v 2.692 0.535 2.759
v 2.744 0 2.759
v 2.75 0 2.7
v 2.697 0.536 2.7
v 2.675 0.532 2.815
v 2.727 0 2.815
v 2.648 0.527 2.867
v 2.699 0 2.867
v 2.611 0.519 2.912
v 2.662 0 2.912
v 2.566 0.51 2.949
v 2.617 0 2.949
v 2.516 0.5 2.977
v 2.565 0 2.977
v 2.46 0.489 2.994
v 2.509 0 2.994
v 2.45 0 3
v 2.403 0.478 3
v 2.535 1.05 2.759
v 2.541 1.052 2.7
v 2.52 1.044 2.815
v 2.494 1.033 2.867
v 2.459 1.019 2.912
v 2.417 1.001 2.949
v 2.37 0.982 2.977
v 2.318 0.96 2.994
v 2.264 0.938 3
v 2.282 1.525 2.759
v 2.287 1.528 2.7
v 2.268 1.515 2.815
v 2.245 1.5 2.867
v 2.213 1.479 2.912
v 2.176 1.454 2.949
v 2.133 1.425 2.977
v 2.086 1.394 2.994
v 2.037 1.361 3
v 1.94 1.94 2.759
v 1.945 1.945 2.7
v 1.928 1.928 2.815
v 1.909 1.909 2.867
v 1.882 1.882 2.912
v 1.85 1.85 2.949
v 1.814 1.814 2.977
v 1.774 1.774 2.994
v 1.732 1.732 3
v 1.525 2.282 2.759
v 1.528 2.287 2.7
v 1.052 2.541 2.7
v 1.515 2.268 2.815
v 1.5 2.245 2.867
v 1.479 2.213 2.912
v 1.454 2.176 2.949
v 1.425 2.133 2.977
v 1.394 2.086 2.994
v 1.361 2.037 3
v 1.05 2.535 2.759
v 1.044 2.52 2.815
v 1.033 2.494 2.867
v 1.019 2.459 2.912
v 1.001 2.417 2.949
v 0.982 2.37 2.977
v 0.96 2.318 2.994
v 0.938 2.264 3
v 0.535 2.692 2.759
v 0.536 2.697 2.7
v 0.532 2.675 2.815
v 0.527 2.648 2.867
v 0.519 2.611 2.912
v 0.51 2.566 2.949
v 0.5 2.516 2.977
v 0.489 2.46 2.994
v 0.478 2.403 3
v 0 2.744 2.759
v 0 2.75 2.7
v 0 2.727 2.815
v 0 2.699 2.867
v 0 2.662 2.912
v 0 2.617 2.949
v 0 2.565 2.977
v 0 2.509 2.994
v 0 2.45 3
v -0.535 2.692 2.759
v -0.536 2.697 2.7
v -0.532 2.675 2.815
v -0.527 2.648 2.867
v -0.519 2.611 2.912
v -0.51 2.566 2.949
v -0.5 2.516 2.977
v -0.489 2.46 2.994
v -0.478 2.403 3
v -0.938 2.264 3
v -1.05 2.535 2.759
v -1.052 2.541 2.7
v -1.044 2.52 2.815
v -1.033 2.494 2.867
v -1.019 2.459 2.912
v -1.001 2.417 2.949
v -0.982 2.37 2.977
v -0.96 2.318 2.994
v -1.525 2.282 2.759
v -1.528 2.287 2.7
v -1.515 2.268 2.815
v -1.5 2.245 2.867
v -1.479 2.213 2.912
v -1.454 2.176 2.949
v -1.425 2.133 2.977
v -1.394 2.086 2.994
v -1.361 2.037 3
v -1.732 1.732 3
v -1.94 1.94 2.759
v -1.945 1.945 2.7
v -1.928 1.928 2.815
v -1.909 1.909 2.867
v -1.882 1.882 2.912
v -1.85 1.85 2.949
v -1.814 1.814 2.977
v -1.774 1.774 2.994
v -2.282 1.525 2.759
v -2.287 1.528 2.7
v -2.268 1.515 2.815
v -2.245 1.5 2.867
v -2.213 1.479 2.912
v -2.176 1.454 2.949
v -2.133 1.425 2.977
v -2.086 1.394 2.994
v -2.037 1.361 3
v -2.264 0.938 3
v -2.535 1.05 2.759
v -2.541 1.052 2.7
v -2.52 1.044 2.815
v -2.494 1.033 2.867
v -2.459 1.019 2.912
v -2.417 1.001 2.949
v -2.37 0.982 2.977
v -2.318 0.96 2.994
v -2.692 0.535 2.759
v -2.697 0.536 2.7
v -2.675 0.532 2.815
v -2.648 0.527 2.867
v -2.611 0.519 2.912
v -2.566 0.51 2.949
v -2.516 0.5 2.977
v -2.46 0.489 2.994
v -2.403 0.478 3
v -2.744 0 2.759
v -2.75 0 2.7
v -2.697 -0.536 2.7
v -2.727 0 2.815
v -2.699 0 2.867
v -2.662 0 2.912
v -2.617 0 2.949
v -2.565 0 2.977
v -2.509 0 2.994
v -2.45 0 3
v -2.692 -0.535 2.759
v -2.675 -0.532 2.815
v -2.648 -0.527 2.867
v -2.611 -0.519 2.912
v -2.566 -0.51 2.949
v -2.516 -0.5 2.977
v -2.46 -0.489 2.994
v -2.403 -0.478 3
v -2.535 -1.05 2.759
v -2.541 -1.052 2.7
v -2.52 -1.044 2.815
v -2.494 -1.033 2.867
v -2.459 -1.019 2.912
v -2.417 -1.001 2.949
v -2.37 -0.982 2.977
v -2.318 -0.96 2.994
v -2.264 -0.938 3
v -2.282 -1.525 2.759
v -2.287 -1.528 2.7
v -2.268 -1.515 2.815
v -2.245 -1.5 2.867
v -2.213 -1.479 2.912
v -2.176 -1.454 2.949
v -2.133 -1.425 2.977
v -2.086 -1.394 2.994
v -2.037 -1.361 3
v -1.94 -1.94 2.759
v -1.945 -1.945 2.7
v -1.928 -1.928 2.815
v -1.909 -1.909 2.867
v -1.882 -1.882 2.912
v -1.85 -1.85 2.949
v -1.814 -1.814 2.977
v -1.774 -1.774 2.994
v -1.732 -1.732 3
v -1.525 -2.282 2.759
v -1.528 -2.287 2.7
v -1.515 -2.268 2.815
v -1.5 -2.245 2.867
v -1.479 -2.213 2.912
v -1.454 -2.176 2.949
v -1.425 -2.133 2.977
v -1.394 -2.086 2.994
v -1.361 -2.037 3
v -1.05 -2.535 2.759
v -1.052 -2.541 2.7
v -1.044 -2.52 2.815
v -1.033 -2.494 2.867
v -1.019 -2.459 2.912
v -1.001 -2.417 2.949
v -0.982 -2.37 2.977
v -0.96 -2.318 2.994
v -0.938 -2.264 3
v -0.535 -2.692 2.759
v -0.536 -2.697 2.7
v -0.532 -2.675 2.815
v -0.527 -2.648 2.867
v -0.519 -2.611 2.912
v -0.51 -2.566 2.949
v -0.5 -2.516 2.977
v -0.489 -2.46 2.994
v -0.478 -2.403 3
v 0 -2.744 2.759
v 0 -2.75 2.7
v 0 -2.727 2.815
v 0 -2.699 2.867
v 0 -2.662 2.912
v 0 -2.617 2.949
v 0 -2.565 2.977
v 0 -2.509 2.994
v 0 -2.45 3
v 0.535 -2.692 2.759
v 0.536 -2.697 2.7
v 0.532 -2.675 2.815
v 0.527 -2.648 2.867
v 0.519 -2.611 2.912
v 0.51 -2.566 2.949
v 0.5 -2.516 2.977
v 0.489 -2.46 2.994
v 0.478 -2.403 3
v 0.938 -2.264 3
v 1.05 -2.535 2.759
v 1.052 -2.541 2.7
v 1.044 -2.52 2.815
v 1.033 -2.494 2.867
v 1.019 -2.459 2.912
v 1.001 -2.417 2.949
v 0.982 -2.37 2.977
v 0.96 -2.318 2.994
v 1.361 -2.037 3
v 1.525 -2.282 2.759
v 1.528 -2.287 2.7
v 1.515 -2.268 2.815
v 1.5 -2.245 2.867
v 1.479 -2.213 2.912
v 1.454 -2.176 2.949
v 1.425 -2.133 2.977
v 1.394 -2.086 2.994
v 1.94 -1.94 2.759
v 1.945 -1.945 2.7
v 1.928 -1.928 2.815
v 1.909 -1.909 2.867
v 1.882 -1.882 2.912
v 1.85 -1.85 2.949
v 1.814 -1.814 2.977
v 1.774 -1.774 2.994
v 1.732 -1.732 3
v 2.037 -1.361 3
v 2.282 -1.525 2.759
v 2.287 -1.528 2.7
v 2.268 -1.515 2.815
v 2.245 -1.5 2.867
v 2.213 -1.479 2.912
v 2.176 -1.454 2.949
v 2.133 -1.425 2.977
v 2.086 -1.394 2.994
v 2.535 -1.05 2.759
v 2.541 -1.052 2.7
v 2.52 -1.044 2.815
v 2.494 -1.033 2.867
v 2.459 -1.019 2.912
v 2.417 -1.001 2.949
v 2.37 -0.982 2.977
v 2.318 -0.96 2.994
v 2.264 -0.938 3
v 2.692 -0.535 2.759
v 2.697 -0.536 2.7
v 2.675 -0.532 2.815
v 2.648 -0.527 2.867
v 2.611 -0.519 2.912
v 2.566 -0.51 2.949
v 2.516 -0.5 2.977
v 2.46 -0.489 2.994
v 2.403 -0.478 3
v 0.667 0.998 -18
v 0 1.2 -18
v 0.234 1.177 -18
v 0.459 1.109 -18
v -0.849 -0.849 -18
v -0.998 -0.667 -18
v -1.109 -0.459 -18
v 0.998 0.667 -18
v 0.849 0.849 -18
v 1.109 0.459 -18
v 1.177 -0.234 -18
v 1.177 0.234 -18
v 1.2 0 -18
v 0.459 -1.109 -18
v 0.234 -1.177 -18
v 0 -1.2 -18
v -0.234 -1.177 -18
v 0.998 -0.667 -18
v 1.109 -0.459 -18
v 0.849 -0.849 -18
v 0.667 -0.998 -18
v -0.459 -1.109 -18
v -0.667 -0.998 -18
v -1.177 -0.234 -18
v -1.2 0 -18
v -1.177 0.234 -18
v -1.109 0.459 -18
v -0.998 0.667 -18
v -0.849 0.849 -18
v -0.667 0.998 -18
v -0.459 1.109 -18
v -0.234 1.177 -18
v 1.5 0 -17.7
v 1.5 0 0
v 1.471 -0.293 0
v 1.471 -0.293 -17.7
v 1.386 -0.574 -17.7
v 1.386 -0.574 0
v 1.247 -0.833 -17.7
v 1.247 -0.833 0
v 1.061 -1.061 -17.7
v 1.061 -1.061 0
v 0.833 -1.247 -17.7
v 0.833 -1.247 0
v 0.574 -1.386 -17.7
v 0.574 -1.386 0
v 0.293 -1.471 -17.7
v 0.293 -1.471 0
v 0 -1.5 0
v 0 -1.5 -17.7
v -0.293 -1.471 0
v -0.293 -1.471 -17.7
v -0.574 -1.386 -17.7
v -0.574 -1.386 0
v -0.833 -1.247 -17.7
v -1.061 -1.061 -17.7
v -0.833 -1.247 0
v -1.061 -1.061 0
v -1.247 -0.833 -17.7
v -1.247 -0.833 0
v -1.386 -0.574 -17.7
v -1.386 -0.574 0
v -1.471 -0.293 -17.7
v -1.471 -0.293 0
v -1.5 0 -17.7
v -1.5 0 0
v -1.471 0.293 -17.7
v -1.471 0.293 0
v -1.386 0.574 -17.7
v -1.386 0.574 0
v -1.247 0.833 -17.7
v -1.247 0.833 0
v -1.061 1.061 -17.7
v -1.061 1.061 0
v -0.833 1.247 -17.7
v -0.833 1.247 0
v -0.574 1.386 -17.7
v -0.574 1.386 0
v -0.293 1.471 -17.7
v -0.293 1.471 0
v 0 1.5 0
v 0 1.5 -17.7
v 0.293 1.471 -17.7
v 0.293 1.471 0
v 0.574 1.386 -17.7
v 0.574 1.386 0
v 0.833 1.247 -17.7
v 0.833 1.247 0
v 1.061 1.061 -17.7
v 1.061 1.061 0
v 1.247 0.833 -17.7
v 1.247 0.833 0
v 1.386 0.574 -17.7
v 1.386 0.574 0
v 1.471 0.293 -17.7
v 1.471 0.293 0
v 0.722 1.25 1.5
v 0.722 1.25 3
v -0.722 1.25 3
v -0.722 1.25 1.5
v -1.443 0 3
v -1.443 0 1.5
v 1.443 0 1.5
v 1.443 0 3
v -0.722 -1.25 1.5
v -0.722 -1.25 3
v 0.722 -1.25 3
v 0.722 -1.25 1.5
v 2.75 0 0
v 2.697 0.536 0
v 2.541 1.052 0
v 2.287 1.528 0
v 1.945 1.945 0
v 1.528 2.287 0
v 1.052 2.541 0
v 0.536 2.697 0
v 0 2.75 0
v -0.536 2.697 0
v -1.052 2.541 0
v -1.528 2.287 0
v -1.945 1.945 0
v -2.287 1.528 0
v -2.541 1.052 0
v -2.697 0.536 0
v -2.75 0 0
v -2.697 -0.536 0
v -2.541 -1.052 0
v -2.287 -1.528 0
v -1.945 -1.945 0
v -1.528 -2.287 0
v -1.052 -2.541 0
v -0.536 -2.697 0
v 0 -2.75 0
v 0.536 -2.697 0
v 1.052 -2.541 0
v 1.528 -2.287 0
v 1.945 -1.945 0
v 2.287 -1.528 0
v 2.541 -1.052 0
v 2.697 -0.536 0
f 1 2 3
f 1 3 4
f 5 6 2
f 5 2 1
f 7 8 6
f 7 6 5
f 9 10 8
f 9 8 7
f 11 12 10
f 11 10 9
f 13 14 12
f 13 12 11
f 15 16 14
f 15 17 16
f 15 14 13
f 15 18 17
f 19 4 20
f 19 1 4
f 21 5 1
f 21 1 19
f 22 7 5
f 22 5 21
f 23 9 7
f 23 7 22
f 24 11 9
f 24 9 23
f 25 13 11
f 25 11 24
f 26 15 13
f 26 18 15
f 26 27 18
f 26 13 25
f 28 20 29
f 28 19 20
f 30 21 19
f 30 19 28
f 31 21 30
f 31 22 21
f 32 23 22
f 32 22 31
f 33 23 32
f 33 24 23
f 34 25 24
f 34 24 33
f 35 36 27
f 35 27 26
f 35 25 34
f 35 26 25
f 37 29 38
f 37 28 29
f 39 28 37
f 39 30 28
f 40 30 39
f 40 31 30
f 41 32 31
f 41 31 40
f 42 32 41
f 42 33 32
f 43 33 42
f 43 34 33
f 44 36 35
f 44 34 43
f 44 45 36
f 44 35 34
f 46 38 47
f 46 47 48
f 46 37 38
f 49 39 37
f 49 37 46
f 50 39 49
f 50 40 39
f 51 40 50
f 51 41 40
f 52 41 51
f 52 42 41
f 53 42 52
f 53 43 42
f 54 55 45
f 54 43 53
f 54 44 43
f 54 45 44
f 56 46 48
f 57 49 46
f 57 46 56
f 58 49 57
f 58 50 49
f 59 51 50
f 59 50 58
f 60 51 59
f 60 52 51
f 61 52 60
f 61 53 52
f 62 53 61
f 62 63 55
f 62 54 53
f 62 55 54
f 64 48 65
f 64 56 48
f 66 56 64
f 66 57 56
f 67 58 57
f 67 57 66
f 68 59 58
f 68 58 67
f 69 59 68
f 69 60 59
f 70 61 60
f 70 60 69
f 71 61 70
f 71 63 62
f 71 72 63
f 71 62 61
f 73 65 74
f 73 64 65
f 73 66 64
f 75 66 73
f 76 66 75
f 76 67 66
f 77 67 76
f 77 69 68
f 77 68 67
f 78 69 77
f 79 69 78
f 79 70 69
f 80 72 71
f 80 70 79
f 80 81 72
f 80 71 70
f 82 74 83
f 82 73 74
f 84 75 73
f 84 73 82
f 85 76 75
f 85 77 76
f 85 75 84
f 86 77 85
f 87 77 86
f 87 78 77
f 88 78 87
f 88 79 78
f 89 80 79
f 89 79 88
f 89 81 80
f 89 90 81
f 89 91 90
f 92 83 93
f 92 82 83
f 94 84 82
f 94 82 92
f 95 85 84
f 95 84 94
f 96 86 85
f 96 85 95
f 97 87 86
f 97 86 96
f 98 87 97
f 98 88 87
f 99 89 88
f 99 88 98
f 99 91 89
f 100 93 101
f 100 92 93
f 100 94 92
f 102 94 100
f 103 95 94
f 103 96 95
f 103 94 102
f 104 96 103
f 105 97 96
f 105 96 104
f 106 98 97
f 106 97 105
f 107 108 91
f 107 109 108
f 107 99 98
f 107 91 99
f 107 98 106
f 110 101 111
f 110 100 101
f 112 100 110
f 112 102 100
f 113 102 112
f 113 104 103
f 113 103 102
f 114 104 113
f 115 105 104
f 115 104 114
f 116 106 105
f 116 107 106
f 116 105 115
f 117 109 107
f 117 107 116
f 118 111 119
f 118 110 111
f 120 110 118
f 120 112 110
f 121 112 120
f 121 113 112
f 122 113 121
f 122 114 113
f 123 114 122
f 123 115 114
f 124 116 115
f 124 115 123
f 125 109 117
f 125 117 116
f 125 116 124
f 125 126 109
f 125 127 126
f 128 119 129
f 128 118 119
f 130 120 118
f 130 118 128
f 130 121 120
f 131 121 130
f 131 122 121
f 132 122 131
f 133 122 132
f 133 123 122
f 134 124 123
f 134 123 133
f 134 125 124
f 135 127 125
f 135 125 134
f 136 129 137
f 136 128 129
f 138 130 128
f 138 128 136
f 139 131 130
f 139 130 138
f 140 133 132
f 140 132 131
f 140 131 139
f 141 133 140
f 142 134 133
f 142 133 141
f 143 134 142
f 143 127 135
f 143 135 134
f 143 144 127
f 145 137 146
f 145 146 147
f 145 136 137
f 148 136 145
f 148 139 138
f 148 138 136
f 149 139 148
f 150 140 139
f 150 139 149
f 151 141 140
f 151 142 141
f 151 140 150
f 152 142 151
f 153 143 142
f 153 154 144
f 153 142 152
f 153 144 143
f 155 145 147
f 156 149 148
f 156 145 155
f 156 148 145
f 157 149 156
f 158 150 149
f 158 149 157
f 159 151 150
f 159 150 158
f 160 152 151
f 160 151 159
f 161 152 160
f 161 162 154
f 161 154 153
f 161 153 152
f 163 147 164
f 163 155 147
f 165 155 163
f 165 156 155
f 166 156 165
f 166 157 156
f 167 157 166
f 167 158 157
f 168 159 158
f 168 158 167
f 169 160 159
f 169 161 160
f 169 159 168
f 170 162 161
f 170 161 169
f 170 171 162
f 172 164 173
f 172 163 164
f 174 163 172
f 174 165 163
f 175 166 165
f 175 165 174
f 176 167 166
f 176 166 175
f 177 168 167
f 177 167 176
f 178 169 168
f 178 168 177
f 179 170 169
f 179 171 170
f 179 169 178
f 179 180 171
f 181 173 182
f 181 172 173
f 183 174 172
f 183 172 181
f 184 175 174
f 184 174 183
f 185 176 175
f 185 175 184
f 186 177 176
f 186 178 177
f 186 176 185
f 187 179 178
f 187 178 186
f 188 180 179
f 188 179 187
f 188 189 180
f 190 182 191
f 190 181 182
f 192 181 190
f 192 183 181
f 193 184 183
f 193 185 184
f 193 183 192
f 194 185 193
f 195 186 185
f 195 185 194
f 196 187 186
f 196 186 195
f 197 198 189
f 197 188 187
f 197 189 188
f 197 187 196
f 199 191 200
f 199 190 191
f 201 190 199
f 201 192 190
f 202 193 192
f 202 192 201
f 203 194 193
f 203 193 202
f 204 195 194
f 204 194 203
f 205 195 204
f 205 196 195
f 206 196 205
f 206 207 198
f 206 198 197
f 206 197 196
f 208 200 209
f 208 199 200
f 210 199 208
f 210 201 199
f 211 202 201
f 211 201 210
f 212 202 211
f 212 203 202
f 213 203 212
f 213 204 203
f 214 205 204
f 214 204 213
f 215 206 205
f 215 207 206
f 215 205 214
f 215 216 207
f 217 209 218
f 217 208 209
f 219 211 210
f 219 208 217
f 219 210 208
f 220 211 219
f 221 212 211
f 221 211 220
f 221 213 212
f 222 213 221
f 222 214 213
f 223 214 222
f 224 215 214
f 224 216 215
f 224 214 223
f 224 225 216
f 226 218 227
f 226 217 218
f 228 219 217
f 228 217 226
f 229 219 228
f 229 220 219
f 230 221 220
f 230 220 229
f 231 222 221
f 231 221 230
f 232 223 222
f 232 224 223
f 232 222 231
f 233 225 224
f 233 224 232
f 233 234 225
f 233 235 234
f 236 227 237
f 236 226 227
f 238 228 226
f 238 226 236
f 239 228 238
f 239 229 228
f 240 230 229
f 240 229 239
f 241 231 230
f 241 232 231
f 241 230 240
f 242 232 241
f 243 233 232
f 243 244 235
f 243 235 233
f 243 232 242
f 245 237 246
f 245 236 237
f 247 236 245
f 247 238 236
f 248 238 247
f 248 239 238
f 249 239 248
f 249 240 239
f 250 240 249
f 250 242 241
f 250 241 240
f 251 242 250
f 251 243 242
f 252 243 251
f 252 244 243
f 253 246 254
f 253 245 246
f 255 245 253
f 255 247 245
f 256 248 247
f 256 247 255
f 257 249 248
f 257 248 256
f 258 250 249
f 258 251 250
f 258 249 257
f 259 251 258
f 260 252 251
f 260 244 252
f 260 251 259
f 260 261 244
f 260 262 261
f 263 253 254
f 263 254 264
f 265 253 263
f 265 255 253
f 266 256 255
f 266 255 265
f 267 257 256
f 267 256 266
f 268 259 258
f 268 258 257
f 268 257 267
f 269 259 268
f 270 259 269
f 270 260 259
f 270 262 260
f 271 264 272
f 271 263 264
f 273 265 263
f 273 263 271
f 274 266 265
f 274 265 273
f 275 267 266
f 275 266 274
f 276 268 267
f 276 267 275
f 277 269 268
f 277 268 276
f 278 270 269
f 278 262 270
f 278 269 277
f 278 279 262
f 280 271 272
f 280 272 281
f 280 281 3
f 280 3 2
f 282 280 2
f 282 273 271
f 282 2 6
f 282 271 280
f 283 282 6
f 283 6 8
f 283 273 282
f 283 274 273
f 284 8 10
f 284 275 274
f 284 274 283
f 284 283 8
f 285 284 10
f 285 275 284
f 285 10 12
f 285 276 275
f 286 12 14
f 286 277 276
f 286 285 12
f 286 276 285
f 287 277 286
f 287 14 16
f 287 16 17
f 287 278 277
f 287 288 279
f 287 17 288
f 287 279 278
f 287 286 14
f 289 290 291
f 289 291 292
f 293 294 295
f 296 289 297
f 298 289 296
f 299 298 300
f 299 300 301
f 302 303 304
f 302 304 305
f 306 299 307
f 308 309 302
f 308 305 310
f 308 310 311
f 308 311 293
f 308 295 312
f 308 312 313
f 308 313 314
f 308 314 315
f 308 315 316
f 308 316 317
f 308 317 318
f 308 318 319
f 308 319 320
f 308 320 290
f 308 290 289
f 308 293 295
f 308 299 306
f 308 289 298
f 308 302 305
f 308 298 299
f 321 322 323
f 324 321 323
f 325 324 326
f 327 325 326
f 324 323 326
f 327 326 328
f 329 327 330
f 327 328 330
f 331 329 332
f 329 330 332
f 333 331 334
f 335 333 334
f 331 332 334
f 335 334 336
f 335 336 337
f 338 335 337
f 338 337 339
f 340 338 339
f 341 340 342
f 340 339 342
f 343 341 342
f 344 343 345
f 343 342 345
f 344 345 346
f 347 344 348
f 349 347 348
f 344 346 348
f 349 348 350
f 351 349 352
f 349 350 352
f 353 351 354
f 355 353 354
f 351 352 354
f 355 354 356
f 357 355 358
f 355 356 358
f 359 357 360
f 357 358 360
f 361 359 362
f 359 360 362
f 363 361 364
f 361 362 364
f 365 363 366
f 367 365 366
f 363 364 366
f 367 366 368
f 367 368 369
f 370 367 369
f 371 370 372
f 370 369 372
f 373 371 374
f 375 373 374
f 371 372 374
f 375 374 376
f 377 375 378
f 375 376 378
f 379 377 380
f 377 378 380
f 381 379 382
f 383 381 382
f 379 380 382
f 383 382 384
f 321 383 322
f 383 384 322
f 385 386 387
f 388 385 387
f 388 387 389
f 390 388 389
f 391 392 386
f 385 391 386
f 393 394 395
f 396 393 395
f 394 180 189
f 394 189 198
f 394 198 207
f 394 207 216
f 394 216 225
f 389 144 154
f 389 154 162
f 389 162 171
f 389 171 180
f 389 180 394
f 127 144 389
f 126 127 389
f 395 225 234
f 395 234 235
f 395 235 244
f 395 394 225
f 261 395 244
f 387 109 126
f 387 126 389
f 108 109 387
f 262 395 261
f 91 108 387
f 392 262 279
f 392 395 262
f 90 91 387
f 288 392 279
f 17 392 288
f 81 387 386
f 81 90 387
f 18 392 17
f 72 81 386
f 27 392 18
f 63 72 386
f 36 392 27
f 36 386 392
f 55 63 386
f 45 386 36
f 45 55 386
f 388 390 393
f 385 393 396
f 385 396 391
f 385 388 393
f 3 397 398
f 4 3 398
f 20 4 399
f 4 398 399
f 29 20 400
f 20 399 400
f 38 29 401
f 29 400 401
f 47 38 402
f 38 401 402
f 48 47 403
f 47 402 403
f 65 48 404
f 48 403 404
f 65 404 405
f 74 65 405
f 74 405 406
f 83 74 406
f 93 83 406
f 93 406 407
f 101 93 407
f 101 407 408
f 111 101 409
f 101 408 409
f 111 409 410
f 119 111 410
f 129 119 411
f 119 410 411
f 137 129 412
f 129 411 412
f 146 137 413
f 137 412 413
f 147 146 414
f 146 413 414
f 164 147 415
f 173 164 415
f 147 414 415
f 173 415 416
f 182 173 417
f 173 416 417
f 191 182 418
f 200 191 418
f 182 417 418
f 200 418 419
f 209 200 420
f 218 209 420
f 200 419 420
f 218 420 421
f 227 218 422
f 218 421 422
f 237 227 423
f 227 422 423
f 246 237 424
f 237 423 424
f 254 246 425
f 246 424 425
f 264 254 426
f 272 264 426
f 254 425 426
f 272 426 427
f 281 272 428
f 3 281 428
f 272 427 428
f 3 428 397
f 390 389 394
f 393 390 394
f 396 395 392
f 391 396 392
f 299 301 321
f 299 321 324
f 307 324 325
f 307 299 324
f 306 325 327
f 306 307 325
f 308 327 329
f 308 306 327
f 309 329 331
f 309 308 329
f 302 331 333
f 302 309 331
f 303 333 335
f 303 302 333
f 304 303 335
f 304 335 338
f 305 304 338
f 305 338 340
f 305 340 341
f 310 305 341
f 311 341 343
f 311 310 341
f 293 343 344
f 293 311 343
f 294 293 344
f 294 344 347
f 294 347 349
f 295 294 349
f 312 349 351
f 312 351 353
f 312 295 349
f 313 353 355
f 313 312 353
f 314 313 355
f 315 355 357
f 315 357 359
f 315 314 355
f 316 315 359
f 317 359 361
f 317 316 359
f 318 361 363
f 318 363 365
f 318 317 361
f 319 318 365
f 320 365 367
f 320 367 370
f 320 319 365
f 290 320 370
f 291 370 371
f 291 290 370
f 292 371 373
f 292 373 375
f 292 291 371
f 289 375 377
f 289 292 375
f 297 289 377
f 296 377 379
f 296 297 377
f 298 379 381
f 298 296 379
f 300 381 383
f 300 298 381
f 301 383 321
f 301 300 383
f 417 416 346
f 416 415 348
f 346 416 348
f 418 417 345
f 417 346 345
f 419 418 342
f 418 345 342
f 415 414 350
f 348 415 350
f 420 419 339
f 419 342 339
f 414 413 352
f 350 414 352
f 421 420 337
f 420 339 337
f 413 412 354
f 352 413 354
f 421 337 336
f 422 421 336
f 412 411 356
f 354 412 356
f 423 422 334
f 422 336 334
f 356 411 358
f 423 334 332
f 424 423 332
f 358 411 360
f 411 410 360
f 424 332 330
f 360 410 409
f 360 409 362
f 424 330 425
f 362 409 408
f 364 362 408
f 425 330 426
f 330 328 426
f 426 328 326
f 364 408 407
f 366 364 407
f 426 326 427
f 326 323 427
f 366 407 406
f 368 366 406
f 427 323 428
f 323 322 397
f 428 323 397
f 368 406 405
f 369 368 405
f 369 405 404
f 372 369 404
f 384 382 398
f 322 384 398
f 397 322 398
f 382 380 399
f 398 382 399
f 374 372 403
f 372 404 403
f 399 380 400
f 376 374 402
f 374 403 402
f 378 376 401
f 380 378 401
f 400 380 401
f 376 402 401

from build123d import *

# Parameters (mm, degrees)
F0_R     = 2.75
F1_DEPTH = 3
F2_R     = 1.5
F3_DEPTH = 18
F4_SIZE  = 0.3
F5_R     = 0.3
F7_DEPTH = 1.5


with BuildPart() as f1:
    # F0 (on Top) → F1 (new body)
    with BuildSketch(Plane.XY):
        Circle(F0_R)
    extrude(amount=F1_DEPTH)

    # F2 (on face) → F3 (join)
    with BuildSketch(Plane(origin=(0, 0, 0), x_dir=(1, 0, 0), z_dir=(0, 0, -1))):
        Circle(F2_R)
    extrude(amount=F3_DEPTH)

    # F4
    f4_edges = [f1.edges().sort_by_distance(p)[0] for p in [
        (-1.5, 0, -18),
    ]]
    chamfer(f4_edges, length=F4_SIZE)

    # F5
    f5_edges = [f1.edges().sort_by_distance(p)[0] for p in [
        (-2.75, 0, 3),
    ]]
    fillet(f5_edges, radius=F5_R)

    # F6 (on face) → F7 (cut)
    with BuildSketch(Plane.XY.offset(3)):
        Polygon((0.721688, 1.25), (-0.721688, 1.25), (-1.443376, 0), (-0.721688, -1.25), (0.721688, -1.25), (1.443376, 0), align=None)
    extrude(amount=-F7_DEPTH, mode=Mode.SUBTRACT)


solid = f1.part
